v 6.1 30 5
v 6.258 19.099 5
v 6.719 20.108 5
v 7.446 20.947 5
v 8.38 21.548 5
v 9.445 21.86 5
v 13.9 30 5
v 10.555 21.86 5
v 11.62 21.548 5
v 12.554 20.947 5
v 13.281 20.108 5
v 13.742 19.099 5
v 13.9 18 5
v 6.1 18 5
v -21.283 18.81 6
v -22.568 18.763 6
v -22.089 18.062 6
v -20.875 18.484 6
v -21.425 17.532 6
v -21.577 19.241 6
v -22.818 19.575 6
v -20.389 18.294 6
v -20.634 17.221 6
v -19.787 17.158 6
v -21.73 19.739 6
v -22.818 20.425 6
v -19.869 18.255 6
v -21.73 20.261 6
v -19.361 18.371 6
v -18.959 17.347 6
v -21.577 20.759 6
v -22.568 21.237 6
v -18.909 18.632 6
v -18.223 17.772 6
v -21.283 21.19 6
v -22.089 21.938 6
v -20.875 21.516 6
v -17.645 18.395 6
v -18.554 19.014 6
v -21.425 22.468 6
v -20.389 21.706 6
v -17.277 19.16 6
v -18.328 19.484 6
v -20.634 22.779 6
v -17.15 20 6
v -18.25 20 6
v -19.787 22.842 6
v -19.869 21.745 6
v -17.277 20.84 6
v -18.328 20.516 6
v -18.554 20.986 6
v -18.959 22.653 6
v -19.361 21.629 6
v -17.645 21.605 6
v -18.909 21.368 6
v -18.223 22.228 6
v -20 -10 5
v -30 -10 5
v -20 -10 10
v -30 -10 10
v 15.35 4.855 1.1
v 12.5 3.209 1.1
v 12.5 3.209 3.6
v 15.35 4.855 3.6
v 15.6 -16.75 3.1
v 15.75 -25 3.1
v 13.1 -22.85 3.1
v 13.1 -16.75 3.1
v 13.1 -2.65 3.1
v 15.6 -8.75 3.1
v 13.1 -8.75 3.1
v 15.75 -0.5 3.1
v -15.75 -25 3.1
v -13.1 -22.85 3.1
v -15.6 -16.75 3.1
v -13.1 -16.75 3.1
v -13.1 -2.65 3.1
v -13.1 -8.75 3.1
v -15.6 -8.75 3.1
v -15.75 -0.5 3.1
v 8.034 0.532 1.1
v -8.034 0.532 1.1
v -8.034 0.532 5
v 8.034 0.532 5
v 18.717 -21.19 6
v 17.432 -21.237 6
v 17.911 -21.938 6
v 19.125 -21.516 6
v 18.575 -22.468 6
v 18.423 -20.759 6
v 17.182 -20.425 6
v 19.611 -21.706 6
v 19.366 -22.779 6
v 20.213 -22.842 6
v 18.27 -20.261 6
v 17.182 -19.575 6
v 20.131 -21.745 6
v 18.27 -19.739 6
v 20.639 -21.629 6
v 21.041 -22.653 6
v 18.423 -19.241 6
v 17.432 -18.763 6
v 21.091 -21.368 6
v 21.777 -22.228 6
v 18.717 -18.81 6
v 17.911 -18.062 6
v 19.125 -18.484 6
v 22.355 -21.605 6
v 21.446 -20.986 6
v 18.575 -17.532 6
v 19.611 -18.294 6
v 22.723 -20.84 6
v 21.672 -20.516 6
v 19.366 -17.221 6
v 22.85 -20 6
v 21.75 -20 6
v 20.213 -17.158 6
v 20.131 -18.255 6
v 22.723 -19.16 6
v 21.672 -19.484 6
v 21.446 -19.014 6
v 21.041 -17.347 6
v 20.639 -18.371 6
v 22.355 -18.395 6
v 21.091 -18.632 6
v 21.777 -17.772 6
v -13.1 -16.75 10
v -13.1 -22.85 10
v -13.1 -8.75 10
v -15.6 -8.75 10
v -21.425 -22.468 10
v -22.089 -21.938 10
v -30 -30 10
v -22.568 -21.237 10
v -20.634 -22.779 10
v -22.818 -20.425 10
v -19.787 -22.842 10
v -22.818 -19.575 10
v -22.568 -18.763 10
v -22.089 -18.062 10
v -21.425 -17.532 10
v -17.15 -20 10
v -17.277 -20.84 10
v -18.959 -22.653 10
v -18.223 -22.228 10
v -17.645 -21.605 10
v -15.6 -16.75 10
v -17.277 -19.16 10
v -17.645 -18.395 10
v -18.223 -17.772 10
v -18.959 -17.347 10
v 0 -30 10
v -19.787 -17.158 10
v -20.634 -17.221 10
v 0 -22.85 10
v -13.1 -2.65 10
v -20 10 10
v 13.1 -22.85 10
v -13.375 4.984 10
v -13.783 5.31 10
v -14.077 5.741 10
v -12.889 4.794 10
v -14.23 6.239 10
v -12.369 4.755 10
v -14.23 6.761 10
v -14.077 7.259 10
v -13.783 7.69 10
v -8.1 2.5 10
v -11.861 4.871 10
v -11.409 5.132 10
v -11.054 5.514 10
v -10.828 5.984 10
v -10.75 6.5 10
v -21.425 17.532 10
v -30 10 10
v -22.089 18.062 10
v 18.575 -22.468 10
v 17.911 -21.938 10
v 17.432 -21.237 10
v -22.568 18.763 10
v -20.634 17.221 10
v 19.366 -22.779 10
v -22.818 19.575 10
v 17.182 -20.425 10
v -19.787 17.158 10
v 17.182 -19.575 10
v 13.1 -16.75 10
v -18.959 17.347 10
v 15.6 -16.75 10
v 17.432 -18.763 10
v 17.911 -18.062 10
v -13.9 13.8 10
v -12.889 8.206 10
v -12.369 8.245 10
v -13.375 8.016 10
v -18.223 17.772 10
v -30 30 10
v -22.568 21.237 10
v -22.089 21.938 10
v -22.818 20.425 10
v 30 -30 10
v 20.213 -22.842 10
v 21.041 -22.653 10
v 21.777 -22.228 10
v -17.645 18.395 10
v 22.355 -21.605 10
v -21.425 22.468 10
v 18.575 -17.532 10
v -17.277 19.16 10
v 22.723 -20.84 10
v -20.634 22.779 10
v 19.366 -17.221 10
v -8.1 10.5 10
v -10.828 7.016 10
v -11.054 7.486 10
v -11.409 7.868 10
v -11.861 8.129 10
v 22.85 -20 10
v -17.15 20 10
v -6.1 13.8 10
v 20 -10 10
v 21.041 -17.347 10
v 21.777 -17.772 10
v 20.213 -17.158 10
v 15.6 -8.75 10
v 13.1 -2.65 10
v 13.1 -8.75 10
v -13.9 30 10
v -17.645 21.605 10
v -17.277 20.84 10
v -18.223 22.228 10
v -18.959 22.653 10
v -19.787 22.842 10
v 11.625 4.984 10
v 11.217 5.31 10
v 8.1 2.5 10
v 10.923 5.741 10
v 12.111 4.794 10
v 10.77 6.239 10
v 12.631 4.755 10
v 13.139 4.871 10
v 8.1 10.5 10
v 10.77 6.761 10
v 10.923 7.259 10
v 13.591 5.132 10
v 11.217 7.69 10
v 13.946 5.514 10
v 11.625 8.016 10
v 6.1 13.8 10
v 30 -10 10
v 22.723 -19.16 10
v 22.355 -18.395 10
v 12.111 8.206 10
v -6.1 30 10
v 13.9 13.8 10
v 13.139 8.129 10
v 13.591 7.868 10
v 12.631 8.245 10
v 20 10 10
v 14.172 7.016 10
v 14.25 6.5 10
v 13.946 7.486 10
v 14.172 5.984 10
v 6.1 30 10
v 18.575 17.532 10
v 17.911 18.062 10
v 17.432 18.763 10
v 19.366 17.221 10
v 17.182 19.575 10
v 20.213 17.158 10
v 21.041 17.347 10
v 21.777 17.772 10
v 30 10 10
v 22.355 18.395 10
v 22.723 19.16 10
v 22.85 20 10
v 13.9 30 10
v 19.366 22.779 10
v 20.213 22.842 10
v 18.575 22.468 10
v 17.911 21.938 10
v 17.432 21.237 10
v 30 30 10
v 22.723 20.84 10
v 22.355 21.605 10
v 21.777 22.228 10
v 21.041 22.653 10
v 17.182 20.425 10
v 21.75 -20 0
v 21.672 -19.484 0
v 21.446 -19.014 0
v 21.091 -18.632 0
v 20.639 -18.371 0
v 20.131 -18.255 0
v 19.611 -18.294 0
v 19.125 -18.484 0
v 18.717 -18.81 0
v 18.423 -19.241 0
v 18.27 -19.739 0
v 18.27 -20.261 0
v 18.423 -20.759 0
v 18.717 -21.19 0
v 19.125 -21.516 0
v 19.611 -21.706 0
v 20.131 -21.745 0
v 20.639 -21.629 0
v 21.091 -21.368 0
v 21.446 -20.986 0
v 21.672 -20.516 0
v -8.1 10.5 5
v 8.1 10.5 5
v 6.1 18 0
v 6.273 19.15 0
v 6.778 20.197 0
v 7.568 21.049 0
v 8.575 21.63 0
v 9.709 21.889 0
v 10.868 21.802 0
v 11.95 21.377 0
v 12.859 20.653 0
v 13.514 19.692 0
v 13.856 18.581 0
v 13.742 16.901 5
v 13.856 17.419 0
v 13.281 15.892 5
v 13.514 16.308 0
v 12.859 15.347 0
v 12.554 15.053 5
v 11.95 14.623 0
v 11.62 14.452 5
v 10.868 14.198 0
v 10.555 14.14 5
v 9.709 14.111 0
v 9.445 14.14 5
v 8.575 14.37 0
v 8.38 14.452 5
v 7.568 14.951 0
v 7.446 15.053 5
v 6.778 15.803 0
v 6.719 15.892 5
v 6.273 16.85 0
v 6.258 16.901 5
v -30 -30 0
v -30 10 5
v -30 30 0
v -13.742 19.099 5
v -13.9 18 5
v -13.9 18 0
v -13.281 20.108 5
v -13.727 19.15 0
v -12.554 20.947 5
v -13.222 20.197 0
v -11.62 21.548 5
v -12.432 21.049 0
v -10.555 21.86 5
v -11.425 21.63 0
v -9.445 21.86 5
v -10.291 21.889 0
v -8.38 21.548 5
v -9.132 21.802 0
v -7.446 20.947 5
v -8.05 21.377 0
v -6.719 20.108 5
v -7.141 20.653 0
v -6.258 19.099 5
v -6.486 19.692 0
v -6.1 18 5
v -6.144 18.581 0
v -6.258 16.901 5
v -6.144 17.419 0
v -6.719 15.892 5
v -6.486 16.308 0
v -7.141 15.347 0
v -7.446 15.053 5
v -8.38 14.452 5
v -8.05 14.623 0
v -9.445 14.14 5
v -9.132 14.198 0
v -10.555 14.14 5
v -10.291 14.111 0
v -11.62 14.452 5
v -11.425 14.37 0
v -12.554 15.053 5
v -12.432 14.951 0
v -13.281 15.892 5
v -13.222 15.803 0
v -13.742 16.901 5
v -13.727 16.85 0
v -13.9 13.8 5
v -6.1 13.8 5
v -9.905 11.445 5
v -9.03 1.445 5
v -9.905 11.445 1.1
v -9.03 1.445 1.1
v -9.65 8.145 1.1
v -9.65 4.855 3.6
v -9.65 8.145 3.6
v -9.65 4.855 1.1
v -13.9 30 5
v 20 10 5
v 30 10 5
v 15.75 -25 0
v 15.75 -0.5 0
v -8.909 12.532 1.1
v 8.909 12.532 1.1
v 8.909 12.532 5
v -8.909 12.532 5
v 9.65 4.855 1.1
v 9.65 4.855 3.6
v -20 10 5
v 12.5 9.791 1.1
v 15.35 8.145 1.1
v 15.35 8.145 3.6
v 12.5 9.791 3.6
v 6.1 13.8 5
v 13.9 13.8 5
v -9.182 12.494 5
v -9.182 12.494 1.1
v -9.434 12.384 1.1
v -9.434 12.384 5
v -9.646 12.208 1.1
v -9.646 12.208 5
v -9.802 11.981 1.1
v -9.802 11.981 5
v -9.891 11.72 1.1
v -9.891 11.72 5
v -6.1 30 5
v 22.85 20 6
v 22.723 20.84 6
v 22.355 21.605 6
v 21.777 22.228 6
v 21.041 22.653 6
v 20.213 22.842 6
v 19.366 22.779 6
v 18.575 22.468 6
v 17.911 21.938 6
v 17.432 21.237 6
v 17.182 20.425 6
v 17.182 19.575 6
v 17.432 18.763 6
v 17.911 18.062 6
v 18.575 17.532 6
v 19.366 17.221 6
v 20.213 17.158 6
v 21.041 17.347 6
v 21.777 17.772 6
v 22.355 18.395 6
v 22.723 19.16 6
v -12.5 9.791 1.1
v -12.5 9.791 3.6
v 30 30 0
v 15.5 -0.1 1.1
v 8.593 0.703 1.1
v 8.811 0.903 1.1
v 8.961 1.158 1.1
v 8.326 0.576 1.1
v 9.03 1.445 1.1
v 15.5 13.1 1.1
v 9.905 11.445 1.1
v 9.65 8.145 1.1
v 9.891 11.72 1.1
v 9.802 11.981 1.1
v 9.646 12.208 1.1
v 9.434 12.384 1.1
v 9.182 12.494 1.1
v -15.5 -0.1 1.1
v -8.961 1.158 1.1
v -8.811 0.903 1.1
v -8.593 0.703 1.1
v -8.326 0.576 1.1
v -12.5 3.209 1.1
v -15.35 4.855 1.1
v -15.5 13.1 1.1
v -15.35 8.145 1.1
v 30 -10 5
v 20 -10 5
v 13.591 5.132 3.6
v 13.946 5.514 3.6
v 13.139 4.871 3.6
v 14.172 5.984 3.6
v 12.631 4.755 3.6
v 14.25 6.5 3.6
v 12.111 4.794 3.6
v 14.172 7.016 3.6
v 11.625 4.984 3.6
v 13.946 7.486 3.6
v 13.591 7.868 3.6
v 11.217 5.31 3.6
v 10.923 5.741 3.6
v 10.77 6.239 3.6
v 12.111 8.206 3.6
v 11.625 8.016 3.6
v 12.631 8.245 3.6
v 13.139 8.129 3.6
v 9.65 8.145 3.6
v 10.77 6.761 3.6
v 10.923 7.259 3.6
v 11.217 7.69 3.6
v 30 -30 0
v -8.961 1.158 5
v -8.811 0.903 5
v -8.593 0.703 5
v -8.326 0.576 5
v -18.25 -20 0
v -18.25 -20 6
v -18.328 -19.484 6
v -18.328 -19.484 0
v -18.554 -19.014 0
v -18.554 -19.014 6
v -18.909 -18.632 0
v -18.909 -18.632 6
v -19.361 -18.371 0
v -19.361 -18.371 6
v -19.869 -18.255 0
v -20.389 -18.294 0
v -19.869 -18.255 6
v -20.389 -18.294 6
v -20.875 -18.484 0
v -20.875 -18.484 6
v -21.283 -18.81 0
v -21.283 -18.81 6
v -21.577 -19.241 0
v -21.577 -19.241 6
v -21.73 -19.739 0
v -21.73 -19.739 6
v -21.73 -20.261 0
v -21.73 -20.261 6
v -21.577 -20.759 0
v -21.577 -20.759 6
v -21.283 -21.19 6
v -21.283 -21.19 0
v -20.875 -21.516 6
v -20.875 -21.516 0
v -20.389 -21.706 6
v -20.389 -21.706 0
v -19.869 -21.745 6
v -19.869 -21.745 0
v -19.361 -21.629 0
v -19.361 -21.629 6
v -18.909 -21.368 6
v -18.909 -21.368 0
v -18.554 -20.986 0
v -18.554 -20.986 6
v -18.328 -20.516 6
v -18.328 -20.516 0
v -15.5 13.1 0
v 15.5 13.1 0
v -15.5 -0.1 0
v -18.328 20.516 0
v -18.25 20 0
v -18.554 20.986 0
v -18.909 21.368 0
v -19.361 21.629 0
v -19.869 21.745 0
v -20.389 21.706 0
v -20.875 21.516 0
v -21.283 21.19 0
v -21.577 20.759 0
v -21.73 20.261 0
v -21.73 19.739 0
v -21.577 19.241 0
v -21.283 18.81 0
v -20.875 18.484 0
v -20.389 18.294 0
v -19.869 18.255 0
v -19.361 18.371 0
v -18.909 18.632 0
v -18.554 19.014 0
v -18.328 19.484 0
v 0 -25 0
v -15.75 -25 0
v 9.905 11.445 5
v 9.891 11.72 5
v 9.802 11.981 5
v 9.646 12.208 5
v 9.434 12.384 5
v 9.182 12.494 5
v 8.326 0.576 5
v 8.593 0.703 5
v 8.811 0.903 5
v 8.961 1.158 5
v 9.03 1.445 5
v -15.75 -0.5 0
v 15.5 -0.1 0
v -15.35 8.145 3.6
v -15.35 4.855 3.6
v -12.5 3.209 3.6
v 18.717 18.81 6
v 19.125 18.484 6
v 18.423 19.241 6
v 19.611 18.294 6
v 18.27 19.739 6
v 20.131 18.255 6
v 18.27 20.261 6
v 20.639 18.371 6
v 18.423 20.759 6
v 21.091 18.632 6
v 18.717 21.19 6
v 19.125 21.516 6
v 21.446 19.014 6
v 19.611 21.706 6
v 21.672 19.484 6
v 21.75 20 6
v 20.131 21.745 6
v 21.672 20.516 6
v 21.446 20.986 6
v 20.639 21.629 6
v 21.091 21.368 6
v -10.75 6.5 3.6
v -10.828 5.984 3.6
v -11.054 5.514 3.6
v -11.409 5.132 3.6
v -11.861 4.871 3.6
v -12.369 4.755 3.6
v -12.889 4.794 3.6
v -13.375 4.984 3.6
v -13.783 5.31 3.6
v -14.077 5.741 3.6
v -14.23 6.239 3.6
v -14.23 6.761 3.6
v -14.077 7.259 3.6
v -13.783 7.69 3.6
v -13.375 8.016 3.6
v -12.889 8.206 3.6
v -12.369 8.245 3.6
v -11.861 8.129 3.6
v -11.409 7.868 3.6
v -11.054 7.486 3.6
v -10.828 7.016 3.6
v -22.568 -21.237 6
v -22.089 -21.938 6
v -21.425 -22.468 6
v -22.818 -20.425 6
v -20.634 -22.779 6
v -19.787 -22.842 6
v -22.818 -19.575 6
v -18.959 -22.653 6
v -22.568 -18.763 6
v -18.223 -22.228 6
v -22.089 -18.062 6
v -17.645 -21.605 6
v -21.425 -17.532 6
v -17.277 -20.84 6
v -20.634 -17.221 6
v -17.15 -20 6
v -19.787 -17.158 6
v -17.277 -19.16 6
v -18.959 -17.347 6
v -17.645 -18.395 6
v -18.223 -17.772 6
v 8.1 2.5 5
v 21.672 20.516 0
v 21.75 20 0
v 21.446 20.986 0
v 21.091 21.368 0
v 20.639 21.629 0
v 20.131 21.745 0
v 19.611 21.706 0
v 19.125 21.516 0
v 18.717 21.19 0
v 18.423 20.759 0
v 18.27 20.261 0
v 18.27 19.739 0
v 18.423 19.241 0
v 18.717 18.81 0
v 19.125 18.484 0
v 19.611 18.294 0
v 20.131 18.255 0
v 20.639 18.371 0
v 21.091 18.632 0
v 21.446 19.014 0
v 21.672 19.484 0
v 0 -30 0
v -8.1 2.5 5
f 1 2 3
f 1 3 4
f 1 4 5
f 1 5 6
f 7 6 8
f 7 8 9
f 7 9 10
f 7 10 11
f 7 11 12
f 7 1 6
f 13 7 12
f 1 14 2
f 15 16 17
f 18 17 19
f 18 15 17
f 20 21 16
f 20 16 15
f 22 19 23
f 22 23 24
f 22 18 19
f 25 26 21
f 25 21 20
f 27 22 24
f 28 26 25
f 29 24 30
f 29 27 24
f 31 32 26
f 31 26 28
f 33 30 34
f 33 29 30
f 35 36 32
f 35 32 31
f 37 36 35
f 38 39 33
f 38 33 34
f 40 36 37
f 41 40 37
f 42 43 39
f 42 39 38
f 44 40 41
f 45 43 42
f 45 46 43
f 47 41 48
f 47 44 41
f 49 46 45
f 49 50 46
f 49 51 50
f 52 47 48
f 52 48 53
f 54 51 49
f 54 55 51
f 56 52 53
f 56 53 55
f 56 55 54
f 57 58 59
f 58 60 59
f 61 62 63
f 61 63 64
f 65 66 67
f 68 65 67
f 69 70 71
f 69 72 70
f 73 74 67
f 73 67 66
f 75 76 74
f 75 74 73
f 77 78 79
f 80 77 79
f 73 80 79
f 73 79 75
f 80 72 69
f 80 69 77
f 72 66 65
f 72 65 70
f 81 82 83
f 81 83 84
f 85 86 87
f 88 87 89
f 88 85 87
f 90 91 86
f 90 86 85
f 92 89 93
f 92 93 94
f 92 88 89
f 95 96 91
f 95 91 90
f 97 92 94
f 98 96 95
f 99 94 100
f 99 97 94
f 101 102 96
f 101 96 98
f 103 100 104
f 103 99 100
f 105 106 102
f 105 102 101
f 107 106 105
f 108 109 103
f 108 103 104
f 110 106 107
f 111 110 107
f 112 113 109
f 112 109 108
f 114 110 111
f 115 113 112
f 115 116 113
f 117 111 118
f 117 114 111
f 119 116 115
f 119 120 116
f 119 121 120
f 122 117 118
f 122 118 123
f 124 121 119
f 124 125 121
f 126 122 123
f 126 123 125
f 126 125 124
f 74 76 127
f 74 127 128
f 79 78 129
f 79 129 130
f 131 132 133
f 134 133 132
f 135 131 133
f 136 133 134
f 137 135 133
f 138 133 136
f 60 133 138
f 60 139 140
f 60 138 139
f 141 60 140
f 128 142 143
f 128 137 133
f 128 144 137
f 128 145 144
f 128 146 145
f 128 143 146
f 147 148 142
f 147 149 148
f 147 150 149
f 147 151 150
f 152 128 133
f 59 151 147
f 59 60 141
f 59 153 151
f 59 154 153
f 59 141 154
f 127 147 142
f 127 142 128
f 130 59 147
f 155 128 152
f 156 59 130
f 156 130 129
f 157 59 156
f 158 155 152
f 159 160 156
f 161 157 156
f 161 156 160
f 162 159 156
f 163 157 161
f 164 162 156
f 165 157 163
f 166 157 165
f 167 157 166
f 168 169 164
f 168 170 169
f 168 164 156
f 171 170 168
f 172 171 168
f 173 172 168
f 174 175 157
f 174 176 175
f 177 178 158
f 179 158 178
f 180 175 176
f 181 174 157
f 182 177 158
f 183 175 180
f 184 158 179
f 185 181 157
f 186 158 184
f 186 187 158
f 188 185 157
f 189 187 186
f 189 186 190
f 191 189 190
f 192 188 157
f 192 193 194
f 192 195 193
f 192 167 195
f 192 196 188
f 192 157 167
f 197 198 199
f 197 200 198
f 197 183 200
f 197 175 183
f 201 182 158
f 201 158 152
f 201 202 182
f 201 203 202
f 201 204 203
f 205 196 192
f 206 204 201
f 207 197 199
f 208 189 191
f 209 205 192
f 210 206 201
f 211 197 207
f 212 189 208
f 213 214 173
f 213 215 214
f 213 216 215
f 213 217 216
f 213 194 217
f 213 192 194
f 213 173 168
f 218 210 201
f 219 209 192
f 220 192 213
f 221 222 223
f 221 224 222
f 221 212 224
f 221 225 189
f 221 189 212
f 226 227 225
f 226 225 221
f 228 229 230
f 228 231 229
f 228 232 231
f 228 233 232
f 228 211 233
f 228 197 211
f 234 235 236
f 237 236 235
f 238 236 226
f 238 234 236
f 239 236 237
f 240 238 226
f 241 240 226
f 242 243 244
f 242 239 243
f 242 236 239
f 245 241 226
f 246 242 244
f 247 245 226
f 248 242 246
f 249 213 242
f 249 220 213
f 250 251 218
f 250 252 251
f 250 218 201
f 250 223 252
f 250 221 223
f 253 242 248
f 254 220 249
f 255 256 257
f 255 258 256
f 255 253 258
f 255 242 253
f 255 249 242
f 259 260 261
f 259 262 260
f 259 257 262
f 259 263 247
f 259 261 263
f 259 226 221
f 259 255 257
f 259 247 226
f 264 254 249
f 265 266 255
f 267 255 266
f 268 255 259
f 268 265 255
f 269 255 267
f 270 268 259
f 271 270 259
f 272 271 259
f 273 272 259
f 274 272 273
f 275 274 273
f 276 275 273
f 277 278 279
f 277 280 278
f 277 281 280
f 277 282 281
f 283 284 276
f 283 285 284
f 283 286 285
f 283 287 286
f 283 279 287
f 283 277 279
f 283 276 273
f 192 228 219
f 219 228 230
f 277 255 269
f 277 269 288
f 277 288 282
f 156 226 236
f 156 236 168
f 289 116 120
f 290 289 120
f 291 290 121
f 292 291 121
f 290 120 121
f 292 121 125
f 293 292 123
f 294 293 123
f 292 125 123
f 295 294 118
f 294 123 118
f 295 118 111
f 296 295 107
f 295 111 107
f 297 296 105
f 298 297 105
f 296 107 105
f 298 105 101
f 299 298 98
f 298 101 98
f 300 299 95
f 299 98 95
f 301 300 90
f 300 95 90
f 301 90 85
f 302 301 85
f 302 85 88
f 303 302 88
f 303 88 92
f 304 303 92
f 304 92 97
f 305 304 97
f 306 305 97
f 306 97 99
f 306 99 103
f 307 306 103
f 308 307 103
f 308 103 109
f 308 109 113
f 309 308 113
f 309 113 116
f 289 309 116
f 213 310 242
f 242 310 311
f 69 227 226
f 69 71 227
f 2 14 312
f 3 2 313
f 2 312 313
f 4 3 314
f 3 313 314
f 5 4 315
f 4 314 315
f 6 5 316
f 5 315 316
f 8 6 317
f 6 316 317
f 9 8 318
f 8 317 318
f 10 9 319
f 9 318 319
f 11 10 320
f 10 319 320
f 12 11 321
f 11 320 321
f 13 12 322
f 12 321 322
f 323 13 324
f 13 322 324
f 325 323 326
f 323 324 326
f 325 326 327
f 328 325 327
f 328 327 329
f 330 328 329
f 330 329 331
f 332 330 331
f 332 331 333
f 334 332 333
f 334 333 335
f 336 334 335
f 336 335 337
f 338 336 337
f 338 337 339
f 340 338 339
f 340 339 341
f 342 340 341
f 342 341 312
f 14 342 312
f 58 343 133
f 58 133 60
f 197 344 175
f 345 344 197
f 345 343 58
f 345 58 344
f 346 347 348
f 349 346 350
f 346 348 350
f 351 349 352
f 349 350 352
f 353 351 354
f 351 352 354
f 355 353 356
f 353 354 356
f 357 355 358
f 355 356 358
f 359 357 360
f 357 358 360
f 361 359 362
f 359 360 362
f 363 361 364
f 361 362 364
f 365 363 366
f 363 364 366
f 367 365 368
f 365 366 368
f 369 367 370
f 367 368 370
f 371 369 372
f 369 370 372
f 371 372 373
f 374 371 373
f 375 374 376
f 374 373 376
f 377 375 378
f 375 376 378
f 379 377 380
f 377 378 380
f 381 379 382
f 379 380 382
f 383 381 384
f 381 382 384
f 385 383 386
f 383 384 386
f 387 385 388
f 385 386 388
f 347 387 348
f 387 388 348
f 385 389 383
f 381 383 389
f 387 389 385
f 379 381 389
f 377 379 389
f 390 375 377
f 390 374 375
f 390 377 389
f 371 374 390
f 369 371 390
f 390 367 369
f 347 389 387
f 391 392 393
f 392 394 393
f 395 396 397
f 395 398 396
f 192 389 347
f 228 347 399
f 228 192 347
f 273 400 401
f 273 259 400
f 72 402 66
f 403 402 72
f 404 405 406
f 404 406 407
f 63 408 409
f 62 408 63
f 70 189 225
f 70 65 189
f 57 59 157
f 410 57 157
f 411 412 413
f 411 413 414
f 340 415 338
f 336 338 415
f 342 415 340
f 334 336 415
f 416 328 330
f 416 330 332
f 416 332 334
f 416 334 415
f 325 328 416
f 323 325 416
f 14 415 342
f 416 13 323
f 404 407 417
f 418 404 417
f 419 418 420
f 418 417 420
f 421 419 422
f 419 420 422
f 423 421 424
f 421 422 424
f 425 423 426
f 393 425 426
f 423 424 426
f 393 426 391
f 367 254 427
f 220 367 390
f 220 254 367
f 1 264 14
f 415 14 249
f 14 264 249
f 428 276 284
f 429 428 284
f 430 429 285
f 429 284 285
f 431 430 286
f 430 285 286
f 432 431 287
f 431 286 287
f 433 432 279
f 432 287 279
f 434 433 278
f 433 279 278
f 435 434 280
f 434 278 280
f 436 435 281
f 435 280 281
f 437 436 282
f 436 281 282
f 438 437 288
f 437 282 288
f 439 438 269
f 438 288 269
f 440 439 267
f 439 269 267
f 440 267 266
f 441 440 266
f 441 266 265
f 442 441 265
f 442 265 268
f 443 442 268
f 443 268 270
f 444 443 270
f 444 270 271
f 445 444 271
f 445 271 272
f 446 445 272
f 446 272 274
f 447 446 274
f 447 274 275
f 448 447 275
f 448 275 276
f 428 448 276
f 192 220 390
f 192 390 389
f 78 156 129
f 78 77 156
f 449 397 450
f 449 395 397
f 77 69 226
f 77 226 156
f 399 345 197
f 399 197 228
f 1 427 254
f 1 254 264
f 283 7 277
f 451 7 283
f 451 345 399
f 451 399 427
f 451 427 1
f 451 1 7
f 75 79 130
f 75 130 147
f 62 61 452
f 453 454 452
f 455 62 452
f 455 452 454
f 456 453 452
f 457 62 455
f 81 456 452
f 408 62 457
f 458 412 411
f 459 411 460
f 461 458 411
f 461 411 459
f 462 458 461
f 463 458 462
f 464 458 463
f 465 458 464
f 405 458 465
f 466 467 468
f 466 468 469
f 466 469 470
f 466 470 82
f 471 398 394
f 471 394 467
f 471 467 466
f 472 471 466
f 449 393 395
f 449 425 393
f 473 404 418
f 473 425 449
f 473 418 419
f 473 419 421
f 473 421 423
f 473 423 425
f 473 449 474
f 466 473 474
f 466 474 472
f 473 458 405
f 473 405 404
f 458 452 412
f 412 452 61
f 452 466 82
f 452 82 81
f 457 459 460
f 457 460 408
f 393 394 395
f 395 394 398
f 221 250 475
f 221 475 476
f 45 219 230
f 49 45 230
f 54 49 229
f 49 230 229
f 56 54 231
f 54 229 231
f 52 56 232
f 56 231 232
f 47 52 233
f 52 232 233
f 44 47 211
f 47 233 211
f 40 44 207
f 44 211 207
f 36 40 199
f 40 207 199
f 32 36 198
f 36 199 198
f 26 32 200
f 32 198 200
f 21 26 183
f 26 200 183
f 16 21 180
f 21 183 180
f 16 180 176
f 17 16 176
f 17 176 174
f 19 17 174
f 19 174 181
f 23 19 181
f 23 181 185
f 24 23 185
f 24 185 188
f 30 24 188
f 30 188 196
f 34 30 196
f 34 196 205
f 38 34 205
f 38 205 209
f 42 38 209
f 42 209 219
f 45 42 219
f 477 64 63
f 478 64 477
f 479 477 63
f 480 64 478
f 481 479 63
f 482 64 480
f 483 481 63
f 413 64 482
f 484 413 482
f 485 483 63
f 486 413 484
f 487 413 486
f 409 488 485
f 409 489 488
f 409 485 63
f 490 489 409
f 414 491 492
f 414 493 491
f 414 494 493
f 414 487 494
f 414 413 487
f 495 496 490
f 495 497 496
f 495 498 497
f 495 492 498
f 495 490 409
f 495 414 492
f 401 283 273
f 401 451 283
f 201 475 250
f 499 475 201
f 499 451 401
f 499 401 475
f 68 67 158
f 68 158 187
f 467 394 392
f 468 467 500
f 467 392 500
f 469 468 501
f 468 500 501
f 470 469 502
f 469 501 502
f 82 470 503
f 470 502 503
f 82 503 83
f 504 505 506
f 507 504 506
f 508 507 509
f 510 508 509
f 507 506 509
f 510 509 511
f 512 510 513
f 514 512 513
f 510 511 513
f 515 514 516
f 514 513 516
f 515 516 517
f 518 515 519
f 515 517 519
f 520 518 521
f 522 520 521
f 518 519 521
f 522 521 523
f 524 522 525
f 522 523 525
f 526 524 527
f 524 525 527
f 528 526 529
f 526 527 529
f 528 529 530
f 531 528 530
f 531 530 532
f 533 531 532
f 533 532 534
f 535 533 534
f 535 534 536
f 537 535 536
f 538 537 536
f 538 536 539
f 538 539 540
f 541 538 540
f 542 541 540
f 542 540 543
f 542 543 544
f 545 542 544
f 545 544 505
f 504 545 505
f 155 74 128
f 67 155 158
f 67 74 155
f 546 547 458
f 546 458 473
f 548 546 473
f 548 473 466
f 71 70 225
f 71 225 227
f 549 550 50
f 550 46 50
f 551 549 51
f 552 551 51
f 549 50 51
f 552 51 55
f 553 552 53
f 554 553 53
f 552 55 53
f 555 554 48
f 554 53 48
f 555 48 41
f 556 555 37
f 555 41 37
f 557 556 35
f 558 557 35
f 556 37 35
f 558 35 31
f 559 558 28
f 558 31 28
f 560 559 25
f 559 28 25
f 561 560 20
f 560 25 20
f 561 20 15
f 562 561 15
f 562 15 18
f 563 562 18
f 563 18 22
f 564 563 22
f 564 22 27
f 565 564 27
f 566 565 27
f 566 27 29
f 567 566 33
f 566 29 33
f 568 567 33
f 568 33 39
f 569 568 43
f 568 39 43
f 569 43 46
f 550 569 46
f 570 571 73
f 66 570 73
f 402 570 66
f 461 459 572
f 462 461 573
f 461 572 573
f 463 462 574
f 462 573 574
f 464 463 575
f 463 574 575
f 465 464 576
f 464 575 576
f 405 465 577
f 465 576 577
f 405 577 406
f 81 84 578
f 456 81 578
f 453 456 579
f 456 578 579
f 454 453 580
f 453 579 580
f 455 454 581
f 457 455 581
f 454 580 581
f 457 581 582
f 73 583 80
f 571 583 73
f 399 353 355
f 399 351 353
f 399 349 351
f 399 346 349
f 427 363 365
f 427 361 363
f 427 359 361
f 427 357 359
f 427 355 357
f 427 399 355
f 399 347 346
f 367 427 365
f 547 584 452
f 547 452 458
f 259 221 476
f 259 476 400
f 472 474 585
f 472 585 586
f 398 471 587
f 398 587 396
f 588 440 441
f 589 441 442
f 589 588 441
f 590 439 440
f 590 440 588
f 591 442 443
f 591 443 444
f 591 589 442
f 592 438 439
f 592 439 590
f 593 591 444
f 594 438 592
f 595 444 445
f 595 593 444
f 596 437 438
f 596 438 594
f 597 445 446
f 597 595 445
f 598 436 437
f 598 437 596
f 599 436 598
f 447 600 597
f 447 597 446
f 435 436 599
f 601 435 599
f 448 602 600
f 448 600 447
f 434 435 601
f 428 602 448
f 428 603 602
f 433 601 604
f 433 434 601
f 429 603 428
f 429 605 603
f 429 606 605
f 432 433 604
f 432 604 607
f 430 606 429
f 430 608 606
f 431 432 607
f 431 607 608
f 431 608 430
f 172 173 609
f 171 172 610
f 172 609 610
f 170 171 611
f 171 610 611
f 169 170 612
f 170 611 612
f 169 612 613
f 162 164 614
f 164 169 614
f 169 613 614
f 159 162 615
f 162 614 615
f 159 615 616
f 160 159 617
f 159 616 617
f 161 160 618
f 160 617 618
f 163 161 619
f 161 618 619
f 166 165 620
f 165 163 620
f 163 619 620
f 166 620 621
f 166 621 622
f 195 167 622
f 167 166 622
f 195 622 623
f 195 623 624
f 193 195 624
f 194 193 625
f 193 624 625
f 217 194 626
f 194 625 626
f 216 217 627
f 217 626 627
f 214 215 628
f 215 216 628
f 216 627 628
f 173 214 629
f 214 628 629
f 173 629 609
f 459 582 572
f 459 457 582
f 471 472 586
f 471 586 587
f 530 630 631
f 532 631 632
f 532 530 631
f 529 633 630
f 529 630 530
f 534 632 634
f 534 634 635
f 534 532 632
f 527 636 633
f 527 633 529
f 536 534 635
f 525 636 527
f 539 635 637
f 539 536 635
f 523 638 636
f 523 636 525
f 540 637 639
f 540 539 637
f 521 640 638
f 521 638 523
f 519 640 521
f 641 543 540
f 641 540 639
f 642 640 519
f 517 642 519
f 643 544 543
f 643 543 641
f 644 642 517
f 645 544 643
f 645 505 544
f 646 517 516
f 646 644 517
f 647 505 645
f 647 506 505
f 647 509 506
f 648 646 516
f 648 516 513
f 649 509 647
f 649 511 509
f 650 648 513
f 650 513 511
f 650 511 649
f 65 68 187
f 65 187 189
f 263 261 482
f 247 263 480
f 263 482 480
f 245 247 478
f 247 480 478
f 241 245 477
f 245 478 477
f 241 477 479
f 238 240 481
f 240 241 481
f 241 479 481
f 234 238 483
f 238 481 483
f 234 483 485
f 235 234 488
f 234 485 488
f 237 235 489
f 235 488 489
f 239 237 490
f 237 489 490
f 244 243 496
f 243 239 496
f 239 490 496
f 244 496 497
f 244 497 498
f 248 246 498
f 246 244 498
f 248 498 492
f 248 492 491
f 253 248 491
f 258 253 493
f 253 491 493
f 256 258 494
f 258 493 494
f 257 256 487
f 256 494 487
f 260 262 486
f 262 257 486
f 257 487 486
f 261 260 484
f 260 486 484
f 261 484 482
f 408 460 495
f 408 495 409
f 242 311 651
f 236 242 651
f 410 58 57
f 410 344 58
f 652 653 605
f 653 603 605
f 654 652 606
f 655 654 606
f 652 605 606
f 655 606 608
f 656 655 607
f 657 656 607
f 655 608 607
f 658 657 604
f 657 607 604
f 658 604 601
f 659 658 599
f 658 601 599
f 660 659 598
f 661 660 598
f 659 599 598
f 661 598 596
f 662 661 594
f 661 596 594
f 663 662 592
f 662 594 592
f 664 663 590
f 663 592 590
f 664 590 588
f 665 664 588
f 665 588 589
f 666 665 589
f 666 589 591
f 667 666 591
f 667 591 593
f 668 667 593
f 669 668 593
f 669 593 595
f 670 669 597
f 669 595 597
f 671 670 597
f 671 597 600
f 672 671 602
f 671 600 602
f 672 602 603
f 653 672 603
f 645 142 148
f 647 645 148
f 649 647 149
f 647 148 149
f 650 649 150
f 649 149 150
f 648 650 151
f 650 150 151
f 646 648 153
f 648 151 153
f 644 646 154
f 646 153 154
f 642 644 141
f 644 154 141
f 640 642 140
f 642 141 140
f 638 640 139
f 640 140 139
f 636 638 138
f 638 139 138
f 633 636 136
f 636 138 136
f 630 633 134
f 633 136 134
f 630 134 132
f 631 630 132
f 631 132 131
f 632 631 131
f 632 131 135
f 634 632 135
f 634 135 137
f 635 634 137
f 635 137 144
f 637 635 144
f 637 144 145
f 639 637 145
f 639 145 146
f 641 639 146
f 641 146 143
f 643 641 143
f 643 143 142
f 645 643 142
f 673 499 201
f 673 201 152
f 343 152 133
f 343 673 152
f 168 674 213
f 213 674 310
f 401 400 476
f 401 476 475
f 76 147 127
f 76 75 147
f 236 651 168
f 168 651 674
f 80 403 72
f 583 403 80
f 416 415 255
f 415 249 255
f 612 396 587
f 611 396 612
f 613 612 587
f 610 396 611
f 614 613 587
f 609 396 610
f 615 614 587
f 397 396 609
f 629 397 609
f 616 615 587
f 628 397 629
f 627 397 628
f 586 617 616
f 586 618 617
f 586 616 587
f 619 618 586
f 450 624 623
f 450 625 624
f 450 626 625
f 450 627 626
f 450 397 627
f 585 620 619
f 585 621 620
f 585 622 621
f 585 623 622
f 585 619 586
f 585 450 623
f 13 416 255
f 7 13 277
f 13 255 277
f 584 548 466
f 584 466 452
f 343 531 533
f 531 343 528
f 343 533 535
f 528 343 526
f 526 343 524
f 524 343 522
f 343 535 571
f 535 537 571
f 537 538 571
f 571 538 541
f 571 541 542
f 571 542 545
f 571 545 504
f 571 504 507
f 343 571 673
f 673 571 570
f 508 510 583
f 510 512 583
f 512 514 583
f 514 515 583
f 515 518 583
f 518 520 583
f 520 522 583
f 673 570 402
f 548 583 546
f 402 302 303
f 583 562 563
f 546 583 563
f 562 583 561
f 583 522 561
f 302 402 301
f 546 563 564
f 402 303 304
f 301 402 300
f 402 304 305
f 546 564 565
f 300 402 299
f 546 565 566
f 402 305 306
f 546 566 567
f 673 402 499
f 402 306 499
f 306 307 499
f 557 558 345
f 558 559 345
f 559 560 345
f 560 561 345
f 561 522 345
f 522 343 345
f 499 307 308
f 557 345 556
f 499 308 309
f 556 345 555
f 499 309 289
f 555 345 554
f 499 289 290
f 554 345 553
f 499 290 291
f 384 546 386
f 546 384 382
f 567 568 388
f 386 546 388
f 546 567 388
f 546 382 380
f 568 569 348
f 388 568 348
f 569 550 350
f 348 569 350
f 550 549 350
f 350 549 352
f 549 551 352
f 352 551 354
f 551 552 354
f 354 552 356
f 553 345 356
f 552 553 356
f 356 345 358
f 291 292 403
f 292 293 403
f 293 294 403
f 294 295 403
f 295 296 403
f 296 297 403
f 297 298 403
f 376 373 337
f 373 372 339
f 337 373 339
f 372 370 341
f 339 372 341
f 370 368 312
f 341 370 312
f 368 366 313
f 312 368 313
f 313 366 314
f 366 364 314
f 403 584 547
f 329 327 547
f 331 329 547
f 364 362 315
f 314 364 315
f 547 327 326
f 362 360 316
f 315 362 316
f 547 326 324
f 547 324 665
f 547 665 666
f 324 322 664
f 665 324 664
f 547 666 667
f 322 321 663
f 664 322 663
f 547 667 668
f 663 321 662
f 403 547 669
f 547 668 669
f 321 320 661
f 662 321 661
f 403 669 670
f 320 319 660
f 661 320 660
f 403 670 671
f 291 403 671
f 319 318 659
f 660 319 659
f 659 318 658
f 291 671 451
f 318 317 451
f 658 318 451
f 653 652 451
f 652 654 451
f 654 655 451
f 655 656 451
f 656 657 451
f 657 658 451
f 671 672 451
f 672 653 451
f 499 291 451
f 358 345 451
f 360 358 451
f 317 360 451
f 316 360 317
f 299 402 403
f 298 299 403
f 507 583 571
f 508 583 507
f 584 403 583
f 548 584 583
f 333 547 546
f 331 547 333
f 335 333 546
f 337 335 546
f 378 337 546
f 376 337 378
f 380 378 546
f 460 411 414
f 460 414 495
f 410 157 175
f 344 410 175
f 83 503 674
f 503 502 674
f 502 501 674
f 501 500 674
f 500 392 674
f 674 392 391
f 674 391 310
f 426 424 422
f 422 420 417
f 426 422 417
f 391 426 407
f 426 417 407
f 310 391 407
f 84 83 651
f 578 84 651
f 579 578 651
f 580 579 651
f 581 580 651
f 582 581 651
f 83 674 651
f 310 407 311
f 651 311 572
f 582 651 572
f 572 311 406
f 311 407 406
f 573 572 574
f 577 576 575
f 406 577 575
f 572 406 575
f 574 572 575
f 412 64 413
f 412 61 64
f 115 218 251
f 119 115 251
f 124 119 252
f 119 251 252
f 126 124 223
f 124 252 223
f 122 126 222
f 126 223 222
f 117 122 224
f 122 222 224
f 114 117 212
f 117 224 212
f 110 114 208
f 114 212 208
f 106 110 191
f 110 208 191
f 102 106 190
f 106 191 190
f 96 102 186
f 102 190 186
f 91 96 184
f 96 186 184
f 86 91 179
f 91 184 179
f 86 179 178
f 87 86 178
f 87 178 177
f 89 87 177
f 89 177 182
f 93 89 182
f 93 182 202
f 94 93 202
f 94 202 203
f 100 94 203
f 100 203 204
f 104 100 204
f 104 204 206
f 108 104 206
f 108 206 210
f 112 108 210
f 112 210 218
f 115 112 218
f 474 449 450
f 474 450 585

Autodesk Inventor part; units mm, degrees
ref_plane "YZ Plane" through (0, 0, 0) normal (1, 0, 0) x (0, 1, 0)
ref_plane "XZ Plane" through (0, 0, 0) normal (0, 1, 0) x (-1, 0, 0)
ref_plane "XY Plane" through (0, 0, 0) normal (0, 0, 1) x (1, 0, 0)
sketch "Sketch1" plane through (0, 0, 0) normal (0, 0, 1) x (1, 0, 0)
  line L0 (-30, 30) -> (30, 30)
  line L1 (30, 30) -> (30, -30)
  line L2 (30, -30) -> (-30, -30)
  line L3 (-30, -30) -> (-30, 30)
  line L4 (-30, 30) -> (30, -30) construction
  line L5 (30, 30) -> (-30, -30) construction
  line L6 (0, 0) -> (0, -32.9158)
  circle A0 centre (-12.5, 6.5) radius 1.75
  circle A1 centre (12.5, 6.5) radius 1.75
  line L7 (-8.1, 10.5) -> (8.1, 10.5)
  line L8 (8.1, 10.5) -> (8.1, 2.5)
  line L9 (8.1, 2.5) -> (-8.1, 2.5)
  line L10 (-8.1, 2.5) -> (-8.1, 10.5)
  line L11 (-8.1, 10.5) -> (8.1, 2.5) construction
  line L12 (8.1, 10.5) -> (-8.1, 2.5) construction
  line L13 (13.1, -2.65) -> (-13.1, -2.65)
  line L14 (-13.1, -2.65) -> (-13.1, -22.85)
  line L15 (-13.1, -22.85) -> (13.1, -22.85)
  line L16 (13.1, -22.85) -> (13.1, -2.65)
  line L17 (13.1, -2.65) -> (-13.1, -22.85) construction
  line L18 (-13.1, -2.65) -> (13.1, -22.85) construction
  line L19 (8.9501, 0.5324) -> (10, 12.5324)
  line L20 (-8.9501, 0.5324) -> (-10, 12.5324)
  line L21 (10, 12.5324) -> (-10, 12.5324)
  line L22 (-8.9501, 0.5324) -> (8.9501, 0.5324)
  line L23 (10, 12.5324) -> (-8.9501, 0.5324)
  line L24 (-10, 12.5324) -> (8.9501, 0.5324)
  line L25 (13.1, -16.75) -> (15.6, -16.75)
  line L26 (15.6, -16.75) -> (15.6, -8.75)
  line L27 (15.6, -8.75) -> (13.1, -8.75)
  line L28 (13.1, -8.75) -> (13.1, -16.75)
  line L29 (-13.1, -8.75) -> (-15.6, -8.75)
  line L30 (-15.6, -8.75) -> (-15.6, -16.75)
  line L31 (-15.6, -16.75) -> (-13.1, -16.75)
  line L32 (-13.1, -16.75) -> (-13.1, -8.75)
  line L33 (0, -12.75) -> (7.7881, -12.75)
  point P0 (0, 6.5)
  point P1 (0, 6.2)
  dimension "d0" = 60
  dimension "d1" = 60
  dimension "d10" = 3.5
  dimension "d11" = 3.5
  dimension "d12" = 25
  dimension "d15" = 16.2
  dimension "d16" = 8
  dimension "d21" = 26.2
  dimension "d22" = 20.2
  dimension "d32" = 17.25
  dimension "d33" = 19.25
  dimension "d61" = 5
  dimension "d62" = 20
  dimension "d63" = 12
  dimension "d67" = 0.3
  dimension "d68" = 2.5
  dimension "d69" = 8
extrude "Extrusion1" add sketch "Sketch1" along normal blind 10 contours L0 L1 L2 L3 | L10 L9 L23 L20 L24 L7 | L24 L21 L23 L7 | L23 L19 L24 L9 L8 L7 | L9 L24 L22 L23
extrude "Extrusion10" cut sketch "Sketch1" along normal blind 5 contours L10 L9 L23 L20 L24 L7 | L24 L21 L23 L7 | L23 L19 L24 L9 L8 L7 | L9 L24 L22 L23
fillet "Fillet1" radius 1 4 edges at (10, 12.5324, 2.5) (-10, 12.5324, 2.5) (-8.9501, 0.5324, 2.5) (8.9501, 0.5324, 2.5)
sketch "Sketch2" plane through (0, 0, 0) normal (0, 0, -1) x (-1, 0, 0)
  line L0 (-15.75, -0.5) -> (15.75, -0.5)
  line L1 (15.75, -0.5) -> (15.75, -25)
  line L2 (15.75, -25) -> (-15.75, -25)
  line L3 (-15.75, -25) -> (-15.75, -0.5)
  line L4 (-15.75, -0.5) -> (15.75, -25) construction
  line L5 (15.75, -0.5) -> (-15.75, -25) construction
  line L6 (13.1, -22.85) -> (13.1, -2.65) projected
  point P0 (0, 0)
  point P1 (0, -12.75)
  point P2 (-15.75, -12.75)
  point P3 (13.1, -12.75)
  dimension "d17" = 31.5
  dimension "d18" = 24.5
extrude "Extrusion2" cut sketch "Sketch2" against normal blind 3.1
sketch "Sketch3" plane through (0, 0, 0) normal (0, 0, -1) x (-1, 0, 0)
  line L0 (-15.5, 13.1) -> (15.5, 13.1)
  line L1 (15.5, 13.1) -> (15.5, -0.1)
  line L2 (15.5, -0.1) -> (-15.5, -0.1)
  line L3 (-15.5, -0.1) -> (-15.5, 13.1)
  line L4 (-15.5, 13.1) -> (15.5, -0.1) construction
  line L5 (15.5, 13.1) -> (-15.5, -0.1) construction
  circle A0 centre (-12.5, 6.5) radius 1.75 projected
  point P0 (0, 0)
  point P1 (0, 6.5)
  dimension "d23" = 31
  dimension "d24" = 13.2
extrude "Extrusion3" cut sketch "Sketch3" against normal blind 1.1 contours L0 L1 L2 L3 | A0
sketch "Sketch4" plane through (0, 0, 0) normal (0, 0, -1) x (-1, 0, 0)
  circle A0 centre (-12.5, 6.5) radius 1.75 projected
  line L0 (-9.65, 8.1454) -> (-9.65, 4.8546)
  line L1 (-9.65, 4.8546) -> (-12.5, 3.2091)
  line L2 (-12.5, 3.2091) -> (-15.35, 4.8546)
  line L3 (-15.35, 4.8546) -> (-15.35, 8.1454)
  line L4 (-15.35, 8.1454) -> (-12.5, 9.7909)
  line L5 (-12.5, 9.7909) -> (-9.65, 8.1454)
  circle A1 centre (12.5, 6.5) radius 1.75 projected
  line L6 (12.5, 9.7909) -> (15.35, 8.1454)
  line L7 (15.35, 8.1454) -> (15.35, 4.8546)
  line L8 (15.35, 4.8546) -> (12.5, 3.2091)
  line L9 (12.5, 3.2091) -> (9.65, 4.8546)
  line L10 (9.65, 4.8546) -> (9.65, 8.1454)
  line L11 (9.65, 8.1454) -> (12.5, 9.7909)
  point P0 (0, 0)
  point P1 (-9.65, 6.5)
  point P2 (-15.35, 6.5)
  dimension "d27" = 5.7
  dimension "d30" = 5.7
extrude "Extrusion4" cut sketch "Sketch4" against normal blind 3.6 contours A0 | L0 L1 L2 L3 L4 L5 | A1 | L6 L7 L8 L9 L10 L11
sketch "Sketch5" plane through (0, 0, 10) normal (0, 0, 1) x (1, 0, 0)
  circle A0 centre (-20, 20) radius 2.85
  line L0 (0, 0) -> (0, 27.5529)
  line L1 (0, 0) -> (35.0302, 0)
  circle A1 centre (20, 20) radius 2.85
  circle A2 centre (-20, -20) radius 2.85
  circle A3 centre (20, -20) radius 2.85
  dimension "d34" = 5.7
  dimension "d35" = 40
  dimension "d36" = 40
extrude "Extrusion5" cut sketch "Sketch5" against normal blind 4
sketch "Sketch6" plane through (0, 0, 0) normal (0, 0, -1) x (-1, 0, 0)
  circle A0 centre (-10, 18) radius 3.9
  circle A1 centre (10, 18) radius 3.9
  line L0 (30, -30) -> (-30, -30) projected
  line L1 (0, 0) -> (0, 19.7)
  dimension "d39" = 7.8
  dimension "d40" = 7.8
  dimension "d41" = 48
  dimension "d42" = 20
extrude "Extrusion6" cut sketch "Sketch6" against normal through all
sketch "Sketch8" plane through (0, 0, 10) normal (0, 0, 1) x (1, 0, 0)
  line L0 (-13.9, 30) -> (-6.1, 30)
  line L1 (-6.1, 30) -> (-6.1, 13.8)
  line L2 (-6.1, 13.8) -> (-13.9, 13.8)
  line L3 (-13.9, 13.8) -> (-13.9, 30)
  line L4 (0, 0) -> (0, 35.6896)
  line L5 (13.9, 30) -> (6.1, 30)
  line L6 (6.1, 30) -> (6.1, 13.8)
  line L7 (6.1, 13.8) -> (13.9, 13.8)
  line L8 (13.9, 13.8) -> (13.9, 30)
  circle A0 centre (-10, 18) radius 3.9 projected
  line L9 (-10, 18) -> (-10, 21.5524)
  line L10 (30, 30) -> (-30, 30) projected
  dimension "d46" = 7.8
  dimension "d48" = 4.2
extrude "Extrusion7" cut sketch "Sketch8" against normal blind 5 contours L5 L8 L7 L6 | L0 L1 A0 L3 | A0 L1 L2 L3
sketch "Sketch9" plane through (-20, 20, 6) normal (0, 0, 1) x (1, 0, 0)
  circle A0 centre (0, 0) radius 1.75
  circle A1 centre (40, 0) radius 2.85 projected
  circle A2 centre (40, 0) radius 1.75
  circle A3 centre (0, -40) radius 2.85 projected
  circle A4 centre (0, -40) radius 1.75
  circle A5 centre (40, -40) radius 2.85 projected
  circle A6 centre (40, -40) radius 1.75
  point P0 (20, -20)
  dimension "d51" = 3.5
  dimension "d52" = 3.5
  dimension "d53" = 3.5
  dimension "d54" = 3.5
extrude "Extrusion8" cut sketch "Sketch9" against normal through all contours A0 | A2 | A4 | A6
sketch "Sketch10" plane through (0, 0, 10) normal (0, 0, 1) x (1, 0, 0)
  line L0 (-30, 30) -> (-30, -30) projected
  line L1 (-20, 10) -> (-30, 10)
  line L2 (-30, 10) -> (-30, -10)
  line L3 (-30, -10) -> (-20, -10)
  line L4 (-20, -10) -> (-20, 10)
  line L5 (-20, 10) -> (-30, -10) construction
  line L6 (-30, 10) -> (-20, -10) construction
  line L7 (0, 0) -> (0, 15.7555)
  line L8 (20, 10) -> (30, 10)
  line L9 (30, 10) -> (30, -10)
  line L10 (30, -10) -> (20, -10)
  line L11 (20, -10) -> (20, 10)
  line L12 (20, 10) -> (30, -10) construction
  line L13 (30, 10) -> (20, -10) construction
  point P0 (-25, 0)
  point P1 (25, 0)
  dimension "d57" = 20
  dimension "d58" = 10
extrude "Extrusion9" cut sketch "Sketch10" against normal blind 5
equation "\"d10\" = d2"
equation "\"d11\" = d2"
equation "\"d30\" = d27"
equation "\"d39\" = d40"
equation "\"d52\" = d51"
equation "\"d53\" = d51"
equation "\"d54\" = d51"
equation "\"d2\" = 3.5"
properties part number "power_signal_socket_fixed"
